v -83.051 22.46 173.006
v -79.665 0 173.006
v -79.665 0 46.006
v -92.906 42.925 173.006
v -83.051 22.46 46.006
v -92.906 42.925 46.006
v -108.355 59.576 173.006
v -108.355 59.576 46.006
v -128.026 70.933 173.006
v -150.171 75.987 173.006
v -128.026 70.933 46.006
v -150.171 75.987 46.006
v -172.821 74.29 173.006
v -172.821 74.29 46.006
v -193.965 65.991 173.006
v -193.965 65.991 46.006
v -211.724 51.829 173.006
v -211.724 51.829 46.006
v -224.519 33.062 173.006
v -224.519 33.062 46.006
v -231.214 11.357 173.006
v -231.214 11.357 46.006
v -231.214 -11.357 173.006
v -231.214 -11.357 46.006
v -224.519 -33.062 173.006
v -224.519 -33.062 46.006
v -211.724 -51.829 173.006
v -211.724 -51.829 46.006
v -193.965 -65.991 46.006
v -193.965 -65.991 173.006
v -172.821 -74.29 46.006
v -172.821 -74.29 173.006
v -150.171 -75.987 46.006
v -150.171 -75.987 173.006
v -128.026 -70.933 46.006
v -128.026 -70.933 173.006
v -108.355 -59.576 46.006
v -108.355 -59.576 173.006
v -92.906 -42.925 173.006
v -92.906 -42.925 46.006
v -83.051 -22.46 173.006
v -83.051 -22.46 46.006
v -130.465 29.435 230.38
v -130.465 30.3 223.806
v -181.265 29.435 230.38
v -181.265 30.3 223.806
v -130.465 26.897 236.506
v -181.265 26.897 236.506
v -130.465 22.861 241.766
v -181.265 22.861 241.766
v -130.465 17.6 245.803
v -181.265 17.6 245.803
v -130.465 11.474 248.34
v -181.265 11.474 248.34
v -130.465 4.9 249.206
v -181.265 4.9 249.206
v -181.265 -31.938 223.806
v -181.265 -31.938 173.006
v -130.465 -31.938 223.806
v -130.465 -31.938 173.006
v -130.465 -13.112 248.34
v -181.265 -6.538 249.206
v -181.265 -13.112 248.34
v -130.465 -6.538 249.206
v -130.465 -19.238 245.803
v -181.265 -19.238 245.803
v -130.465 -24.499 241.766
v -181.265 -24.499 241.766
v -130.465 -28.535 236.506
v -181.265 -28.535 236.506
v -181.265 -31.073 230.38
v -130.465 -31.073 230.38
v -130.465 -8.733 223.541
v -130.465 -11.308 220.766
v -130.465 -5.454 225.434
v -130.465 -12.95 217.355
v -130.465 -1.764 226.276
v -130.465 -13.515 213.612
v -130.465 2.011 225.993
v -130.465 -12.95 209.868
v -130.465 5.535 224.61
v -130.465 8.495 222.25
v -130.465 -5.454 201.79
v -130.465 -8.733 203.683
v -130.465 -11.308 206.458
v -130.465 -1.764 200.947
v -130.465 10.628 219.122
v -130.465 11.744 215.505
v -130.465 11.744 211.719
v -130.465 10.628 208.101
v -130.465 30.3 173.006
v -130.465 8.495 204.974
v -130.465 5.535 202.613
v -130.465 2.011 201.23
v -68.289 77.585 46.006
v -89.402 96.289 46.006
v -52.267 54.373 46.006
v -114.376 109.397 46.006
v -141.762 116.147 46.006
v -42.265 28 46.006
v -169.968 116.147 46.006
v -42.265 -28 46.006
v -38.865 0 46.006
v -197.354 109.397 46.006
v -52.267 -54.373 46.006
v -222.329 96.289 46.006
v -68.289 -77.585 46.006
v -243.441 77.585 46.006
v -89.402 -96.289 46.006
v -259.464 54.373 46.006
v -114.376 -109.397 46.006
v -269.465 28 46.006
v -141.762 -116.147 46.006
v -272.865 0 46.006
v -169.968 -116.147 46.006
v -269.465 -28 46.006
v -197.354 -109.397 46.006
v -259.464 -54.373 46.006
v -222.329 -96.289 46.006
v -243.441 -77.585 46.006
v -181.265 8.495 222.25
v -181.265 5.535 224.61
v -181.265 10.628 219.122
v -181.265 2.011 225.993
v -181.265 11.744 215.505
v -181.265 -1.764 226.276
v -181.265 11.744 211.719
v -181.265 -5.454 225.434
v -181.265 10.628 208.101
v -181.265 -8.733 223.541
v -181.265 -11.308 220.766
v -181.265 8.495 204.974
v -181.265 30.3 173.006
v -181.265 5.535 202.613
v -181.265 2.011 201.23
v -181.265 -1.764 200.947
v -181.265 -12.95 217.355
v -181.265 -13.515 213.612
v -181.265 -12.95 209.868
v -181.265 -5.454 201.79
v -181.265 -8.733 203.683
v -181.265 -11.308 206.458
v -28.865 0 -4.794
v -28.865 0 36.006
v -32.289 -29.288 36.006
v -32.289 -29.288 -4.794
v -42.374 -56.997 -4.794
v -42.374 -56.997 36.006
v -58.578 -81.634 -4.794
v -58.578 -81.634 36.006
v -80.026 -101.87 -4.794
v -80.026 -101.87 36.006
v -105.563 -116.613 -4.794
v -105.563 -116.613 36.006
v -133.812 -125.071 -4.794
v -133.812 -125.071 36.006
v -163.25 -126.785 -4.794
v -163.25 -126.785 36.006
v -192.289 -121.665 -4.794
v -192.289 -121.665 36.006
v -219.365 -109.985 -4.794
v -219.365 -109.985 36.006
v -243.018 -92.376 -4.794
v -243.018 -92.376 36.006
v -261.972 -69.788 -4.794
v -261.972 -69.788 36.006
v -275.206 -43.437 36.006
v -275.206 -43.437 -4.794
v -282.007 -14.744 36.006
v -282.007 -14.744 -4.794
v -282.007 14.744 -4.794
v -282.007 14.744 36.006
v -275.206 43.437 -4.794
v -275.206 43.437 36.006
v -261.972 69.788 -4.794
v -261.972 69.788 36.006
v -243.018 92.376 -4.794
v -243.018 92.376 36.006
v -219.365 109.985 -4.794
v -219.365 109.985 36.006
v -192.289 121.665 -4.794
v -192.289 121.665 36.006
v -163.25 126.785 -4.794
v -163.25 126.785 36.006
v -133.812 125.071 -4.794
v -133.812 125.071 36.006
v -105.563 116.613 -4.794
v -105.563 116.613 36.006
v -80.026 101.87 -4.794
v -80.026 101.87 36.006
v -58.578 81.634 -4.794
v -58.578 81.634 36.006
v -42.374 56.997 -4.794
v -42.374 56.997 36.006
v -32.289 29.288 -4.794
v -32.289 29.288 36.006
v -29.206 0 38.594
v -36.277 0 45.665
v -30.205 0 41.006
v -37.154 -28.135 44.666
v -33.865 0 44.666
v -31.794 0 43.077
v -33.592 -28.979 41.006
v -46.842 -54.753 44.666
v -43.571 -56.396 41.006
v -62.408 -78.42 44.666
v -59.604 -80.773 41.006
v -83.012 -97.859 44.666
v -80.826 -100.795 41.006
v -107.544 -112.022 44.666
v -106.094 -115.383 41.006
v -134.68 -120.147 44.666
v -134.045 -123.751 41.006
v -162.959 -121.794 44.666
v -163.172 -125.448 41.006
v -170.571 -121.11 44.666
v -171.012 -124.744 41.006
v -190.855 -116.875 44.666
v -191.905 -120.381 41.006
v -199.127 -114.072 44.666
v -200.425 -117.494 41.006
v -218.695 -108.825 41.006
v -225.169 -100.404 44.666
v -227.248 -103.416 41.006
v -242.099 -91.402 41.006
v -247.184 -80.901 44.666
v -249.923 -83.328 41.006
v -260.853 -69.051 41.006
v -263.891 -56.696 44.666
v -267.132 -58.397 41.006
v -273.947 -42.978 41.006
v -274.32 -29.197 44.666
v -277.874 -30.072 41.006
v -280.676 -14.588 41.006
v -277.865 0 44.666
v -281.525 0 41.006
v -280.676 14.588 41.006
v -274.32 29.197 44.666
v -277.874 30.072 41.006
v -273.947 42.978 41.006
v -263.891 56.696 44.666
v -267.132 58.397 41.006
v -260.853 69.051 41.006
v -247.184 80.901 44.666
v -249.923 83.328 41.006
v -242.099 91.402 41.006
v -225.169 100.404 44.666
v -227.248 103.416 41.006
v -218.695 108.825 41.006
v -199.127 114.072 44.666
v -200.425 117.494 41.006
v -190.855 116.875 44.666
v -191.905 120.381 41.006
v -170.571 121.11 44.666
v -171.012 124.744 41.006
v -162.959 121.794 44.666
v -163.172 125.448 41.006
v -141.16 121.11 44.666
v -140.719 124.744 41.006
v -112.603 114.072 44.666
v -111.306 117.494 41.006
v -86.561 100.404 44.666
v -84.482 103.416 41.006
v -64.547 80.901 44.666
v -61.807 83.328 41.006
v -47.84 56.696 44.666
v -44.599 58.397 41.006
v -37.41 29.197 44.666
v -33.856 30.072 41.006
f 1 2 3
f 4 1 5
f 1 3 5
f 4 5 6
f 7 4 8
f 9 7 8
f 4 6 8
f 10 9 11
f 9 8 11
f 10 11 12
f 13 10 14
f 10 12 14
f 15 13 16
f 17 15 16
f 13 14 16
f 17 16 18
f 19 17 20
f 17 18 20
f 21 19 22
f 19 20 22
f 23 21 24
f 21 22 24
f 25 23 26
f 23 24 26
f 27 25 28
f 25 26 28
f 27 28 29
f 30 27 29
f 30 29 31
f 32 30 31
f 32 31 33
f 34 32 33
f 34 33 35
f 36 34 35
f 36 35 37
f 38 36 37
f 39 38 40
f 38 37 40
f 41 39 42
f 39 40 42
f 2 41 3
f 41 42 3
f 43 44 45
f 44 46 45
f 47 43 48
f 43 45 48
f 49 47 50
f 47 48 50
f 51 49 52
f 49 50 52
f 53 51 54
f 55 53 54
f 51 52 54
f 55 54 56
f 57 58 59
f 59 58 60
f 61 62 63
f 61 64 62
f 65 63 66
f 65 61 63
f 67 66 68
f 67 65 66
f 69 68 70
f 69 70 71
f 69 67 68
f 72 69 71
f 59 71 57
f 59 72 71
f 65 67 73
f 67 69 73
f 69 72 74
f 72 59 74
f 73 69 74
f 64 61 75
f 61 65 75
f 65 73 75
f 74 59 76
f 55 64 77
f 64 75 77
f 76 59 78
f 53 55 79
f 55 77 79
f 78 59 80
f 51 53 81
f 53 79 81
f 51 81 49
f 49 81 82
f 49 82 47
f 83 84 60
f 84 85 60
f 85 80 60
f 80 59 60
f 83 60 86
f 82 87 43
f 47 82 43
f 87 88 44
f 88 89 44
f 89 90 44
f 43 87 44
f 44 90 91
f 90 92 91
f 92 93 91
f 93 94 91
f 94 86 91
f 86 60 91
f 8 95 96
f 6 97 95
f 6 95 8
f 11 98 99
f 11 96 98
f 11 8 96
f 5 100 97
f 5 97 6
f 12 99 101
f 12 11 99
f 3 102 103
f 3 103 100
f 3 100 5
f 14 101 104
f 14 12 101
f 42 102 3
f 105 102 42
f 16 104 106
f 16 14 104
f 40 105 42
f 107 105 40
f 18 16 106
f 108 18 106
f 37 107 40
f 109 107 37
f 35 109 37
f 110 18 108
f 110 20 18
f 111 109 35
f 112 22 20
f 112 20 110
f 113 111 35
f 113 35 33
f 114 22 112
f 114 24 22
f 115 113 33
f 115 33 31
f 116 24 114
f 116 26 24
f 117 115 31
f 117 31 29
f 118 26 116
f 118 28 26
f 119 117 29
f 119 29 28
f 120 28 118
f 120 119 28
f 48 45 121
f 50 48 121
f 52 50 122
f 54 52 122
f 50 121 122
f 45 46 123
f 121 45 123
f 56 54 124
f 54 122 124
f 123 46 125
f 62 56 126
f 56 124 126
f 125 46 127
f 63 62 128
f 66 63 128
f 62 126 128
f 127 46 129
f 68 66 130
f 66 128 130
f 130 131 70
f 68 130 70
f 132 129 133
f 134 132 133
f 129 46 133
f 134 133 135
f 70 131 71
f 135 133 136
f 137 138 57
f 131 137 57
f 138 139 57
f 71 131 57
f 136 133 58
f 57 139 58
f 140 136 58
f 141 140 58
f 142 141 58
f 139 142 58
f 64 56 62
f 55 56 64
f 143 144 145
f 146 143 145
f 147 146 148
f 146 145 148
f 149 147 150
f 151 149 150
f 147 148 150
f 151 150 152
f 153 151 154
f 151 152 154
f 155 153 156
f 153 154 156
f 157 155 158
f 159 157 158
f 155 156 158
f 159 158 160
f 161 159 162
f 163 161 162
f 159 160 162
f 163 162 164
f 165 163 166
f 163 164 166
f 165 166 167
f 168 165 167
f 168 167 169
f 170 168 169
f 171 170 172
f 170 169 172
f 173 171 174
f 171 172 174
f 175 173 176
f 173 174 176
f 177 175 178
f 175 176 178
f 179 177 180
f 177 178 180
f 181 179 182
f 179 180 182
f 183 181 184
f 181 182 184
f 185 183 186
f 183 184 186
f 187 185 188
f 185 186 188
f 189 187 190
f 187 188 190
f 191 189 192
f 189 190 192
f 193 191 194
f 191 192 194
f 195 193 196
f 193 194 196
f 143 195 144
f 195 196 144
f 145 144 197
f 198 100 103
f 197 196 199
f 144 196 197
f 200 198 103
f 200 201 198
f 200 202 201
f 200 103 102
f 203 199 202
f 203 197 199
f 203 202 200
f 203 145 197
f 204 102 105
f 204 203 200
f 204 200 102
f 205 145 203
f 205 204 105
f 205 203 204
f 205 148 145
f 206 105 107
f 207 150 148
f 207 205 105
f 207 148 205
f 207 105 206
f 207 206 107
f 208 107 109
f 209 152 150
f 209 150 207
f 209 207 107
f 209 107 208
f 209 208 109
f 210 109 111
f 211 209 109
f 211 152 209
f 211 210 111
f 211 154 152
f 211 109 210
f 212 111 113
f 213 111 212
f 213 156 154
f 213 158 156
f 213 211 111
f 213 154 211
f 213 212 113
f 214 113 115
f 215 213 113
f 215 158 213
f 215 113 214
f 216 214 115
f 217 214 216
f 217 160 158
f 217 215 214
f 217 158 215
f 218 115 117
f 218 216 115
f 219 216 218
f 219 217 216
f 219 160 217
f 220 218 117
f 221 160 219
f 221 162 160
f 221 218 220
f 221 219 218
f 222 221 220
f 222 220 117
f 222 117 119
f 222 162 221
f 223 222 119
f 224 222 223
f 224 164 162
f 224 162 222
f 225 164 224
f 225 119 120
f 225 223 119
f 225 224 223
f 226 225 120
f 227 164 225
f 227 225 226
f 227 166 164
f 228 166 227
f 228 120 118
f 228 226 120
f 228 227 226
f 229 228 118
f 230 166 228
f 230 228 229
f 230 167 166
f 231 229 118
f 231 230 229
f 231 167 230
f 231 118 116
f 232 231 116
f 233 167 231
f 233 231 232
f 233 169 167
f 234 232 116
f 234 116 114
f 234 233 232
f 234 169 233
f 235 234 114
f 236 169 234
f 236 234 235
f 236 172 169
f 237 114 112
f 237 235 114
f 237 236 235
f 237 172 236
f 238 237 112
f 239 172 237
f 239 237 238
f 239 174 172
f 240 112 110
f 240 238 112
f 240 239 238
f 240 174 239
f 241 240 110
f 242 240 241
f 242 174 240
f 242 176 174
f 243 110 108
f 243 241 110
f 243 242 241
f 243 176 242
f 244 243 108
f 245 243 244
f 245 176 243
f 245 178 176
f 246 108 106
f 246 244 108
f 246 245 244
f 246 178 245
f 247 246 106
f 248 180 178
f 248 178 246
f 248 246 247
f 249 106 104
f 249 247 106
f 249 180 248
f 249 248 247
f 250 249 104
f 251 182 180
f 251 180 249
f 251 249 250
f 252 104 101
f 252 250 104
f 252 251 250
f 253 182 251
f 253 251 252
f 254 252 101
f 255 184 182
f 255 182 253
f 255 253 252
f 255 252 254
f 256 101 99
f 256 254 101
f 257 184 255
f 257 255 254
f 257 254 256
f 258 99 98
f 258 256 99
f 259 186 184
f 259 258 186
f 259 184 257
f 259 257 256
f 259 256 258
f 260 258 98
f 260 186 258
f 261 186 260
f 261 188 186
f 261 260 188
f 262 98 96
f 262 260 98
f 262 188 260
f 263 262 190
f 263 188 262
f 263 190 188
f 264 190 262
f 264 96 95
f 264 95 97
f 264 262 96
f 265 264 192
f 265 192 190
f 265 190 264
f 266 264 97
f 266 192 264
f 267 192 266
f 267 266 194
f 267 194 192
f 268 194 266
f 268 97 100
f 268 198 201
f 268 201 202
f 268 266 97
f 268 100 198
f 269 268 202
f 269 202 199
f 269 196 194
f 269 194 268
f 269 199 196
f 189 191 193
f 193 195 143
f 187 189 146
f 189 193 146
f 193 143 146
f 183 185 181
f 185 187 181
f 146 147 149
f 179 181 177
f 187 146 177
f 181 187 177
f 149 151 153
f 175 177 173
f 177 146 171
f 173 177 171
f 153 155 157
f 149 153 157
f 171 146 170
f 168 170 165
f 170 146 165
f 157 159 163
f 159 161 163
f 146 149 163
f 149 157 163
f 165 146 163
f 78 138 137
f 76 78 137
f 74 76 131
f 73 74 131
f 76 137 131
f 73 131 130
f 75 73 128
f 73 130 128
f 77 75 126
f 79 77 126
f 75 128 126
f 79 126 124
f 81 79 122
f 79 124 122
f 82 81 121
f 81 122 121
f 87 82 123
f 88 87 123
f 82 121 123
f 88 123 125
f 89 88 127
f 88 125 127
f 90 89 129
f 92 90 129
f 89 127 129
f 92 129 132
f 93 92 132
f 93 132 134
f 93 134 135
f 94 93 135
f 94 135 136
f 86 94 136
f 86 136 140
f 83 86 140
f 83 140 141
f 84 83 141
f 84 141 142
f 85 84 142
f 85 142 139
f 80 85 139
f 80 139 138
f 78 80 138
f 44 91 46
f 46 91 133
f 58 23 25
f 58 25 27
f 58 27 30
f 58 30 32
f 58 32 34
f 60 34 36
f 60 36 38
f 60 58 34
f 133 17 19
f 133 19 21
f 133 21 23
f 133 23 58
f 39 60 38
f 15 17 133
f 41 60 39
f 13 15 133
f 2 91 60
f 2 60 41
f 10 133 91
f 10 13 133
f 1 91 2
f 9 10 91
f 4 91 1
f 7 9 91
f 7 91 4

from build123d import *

# Parameters (mm, degrees)
F0_W      = 127
F0_H      = 50.8
F2_R      = 76.2
F3_DEPTH  = 127
F5_DEPTH  = 76.2
F6_R      = 25.4
F7_R      = 25.4
F8_R      = 12.7
F10_DEPTH = 152.401
F11_R     = 10


with BuildPart() as f1:
    # F0 (on Front) → F1 (revolve)
    with BuildSketch(Plane.XZ):
        with Locations((-92.3652442396, 20.6056353453)):
            Rectangle(F0_W, F0_H)
    revolve(axis=Axis((-155.8652442396, 0, 20.6056353453), (0, 0, -1)))

    # F2 (on face) → F3 (join)
    with BuildSketch(Plane.XY.offset(46.0056353453)):
        with Locations((-155.8652442396, 0)):
            Circle(F2_R)
    extrude(amount=F3_DEPTH)

    # F4 (on face) → F5 (join)
    with BuildSketch(Plane.XY.offset(173.0056353453)):
        Polygon((-130.4652442396, 30.3003561618), (-155.8652442396, 30.3003561618), (-181.2652442396, 30.3003561618), (-181.2652442396, -31.9382007305), (-155.8652442396, -31.9382007305), (-130.4652442396, -31.9382007305), align=None)
    extrude(amount=F5_DEPTH)

    # F6
    f6_edges = [f1.edges().sort_by_distance(p)[0] for p in [
        (-155.865244, 30.300356, 249.205635),
    ]]
    fillet(f6_edges, radius=F6_R)

    # F7
    f7_edges = [f1.edges().sort_by_distance(p)[0] for p in [
        (-155.865244, -31.938201, 249.205635),
    ]]
    fillet(f7_edges, radius=F7_R)

    # F8 (on face) → F10 (cut, through all)
    with BuildSketch(Plane(origin=(-181.2652442396, 0, 0), x_dir=(0, -1, 0), z_dir=(-1, 0, 0))):
        with Locations((0.8146438382, 213.611766696)):
            Circle(F8_R)
    extrude(amount=-F10_DEPTH, mode=Mode.SUBTRACT)

    # F11
    f11_edges = [f1.edges().sort_by_distance(p)[0] for p in [
        (-282.865244, 0, 46.005635),
    ]]
    fillet(f11_edges, radius=F11_R)


solid = f1.part
